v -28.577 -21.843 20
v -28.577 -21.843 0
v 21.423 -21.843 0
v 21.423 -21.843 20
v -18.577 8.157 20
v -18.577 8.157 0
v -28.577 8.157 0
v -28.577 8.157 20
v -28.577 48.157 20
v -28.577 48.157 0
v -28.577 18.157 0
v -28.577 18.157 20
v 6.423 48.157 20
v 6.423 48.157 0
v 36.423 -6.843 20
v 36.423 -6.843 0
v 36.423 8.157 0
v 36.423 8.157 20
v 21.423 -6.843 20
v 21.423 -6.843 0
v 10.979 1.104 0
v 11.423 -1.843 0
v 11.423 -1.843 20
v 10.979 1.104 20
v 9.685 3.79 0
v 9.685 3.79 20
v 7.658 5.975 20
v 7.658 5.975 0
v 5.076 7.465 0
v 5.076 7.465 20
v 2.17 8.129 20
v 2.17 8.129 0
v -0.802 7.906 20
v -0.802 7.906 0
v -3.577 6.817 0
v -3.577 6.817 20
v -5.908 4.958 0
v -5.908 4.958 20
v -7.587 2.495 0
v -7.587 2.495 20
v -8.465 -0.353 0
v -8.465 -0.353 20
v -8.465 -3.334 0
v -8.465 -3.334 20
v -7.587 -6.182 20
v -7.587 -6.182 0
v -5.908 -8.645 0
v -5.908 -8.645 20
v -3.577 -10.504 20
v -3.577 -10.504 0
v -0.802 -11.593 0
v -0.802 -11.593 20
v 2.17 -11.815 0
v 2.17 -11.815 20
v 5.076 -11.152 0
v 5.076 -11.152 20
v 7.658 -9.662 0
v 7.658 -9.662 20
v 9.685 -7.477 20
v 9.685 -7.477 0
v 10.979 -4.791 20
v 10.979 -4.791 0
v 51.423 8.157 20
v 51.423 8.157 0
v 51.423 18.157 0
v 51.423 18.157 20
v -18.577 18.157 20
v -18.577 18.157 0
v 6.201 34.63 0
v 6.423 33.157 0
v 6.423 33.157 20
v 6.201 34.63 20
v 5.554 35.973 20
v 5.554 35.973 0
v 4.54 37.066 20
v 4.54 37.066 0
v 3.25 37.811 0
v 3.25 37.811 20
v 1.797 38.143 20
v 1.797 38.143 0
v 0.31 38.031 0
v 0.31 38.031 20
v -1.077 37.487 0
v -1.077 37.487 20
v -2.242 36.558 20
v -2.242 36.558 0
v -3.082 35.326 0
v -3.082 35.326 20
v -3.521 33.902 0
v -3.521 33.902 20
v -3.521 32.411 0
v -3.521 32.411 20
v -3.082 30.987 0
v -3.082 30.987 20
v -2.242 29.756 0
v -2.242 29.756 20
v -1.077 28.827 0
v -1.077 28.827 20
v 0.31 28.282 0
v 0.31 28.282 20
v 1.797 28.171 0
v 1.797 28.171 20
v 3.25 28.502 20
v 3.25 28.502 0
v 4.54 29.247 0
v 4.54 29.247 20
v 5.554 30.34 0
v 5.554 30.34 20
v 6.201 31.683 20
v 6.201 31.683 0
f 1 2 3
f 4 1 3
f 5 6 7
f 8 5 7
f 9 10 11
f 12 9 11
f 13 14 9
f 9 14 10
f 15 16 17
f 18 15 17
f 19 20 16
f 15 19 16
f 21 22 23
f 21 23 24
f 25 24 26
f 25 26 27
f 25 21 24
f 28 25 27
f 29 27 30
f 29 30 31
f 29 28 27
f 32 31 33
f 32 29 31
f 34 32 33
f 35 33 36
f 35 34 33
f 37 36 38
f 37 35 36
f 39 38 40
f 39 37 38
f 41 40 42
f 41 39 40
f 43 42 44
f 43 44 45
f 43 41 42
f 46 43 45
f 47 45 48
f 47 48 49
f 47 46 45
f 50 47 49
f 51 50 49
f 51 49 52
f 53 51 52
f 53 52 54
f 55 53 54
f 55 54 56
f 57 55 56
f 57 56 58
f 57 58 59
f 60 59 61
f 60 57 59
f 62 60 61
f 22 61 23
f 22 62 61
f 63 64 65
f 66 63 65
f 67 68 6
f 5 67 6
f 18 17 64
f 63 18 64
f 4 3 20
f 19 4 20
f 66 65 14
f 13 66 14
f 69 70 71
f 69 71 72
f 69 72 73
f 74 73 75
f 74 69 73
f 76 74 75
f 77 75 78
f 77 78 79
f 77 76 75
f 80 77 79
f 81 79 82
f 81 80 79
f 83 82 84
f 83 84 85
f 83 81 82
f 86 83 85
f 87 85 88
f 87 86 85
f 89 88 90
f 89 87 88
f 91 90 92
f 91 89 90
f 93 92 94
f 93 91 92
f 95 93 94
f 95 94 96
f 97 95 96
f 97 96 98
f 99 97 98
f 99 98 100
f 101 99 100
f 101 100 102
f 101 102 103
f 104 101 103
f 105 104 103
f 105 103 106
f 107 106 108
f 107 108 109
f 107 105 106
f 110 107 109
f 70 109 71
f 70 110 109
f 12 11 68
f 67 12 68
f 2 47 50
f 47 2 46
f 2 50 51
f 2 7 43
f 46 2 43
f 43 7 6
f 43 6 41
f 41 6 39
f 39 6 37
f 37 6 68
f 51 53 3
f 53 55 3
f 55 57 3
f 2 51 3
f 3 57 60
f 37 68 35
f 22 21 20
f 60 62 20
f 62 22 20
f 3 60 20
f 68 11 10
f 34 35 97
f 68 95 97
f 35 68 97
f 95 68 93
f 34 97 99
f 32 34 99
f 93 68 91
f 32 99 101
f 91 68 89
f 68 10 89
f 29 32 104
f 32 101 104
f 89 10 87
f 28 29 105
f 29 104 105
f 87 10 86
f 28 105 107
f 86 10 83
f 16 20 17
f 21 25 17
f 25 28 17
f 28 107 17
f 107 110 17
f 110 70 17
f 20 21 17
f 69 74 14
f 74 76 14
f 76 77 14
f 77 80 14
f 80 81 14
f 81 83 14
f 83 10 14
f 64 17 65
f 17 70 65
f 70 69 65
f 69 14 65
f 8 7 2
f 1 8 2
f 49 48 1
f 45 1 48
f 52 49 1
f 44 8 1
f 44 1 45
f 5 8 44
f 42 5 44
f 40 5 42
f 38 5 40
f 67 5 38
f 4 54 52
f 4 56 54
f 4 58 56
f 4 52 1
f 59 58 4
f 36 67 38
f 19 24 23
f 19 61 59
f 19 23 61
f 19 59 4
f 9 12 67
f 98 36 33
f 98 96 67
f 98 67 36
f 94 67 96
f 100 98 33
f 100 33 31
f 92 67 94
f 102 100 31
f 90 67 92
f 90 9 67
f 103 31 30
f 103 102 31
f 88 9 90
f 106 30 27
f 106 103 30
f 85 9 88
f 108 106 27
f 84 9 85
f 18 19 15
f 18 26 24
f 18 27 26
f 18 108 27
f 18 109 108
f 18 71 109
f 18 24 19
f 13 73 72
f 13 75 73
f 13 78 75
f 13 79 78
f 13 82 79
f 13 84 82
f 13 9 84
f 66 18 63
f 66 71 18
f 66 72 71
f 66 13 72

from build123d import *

# Parameters (mm, degrees)
SKETCH1_R           = 10
SKETCH1_R_2         = 5
BOSS_EXTRUDE3_DEPTH = 20


with BuildPart() as part:
    # Sketch1 → Boss-Extrude3 (new body)
    with BuildSketch(Plane.XY):
        Polygon((-28.577015359, 8.156649179), (-28.577015359, 0.131238945), (-28.577015359, 0), (-28.577015359, -21.843350821), (21.422984641, -21.843350821), (21.422984641, -6.843350821), (36.422984641, -6.843350821), (36.422984641, 8.156649179), (51.422984641, 8.156649179), (51.422984641, 18.156649179), (6.422984641, 48.156649179), (-28.577015359, 48.156649179), (-28.577015359, 18.156649179), (-18.577015359, 18.156649179), (-18.577015359, 8.156649179), align=None)
        with Locations((1.422984641, -1.843350821)):
            Circle(SKETCH1_R, mode=Mode.SUBTRACT)
        with Locations((1.422984641, 33.156649179)):
            Circle(SKETCH1_R_2, mode=Mode.SUBTRACT)
    extrude(amount=BOSS_EXTRUDE3_DEPTH)


solid = part.part
